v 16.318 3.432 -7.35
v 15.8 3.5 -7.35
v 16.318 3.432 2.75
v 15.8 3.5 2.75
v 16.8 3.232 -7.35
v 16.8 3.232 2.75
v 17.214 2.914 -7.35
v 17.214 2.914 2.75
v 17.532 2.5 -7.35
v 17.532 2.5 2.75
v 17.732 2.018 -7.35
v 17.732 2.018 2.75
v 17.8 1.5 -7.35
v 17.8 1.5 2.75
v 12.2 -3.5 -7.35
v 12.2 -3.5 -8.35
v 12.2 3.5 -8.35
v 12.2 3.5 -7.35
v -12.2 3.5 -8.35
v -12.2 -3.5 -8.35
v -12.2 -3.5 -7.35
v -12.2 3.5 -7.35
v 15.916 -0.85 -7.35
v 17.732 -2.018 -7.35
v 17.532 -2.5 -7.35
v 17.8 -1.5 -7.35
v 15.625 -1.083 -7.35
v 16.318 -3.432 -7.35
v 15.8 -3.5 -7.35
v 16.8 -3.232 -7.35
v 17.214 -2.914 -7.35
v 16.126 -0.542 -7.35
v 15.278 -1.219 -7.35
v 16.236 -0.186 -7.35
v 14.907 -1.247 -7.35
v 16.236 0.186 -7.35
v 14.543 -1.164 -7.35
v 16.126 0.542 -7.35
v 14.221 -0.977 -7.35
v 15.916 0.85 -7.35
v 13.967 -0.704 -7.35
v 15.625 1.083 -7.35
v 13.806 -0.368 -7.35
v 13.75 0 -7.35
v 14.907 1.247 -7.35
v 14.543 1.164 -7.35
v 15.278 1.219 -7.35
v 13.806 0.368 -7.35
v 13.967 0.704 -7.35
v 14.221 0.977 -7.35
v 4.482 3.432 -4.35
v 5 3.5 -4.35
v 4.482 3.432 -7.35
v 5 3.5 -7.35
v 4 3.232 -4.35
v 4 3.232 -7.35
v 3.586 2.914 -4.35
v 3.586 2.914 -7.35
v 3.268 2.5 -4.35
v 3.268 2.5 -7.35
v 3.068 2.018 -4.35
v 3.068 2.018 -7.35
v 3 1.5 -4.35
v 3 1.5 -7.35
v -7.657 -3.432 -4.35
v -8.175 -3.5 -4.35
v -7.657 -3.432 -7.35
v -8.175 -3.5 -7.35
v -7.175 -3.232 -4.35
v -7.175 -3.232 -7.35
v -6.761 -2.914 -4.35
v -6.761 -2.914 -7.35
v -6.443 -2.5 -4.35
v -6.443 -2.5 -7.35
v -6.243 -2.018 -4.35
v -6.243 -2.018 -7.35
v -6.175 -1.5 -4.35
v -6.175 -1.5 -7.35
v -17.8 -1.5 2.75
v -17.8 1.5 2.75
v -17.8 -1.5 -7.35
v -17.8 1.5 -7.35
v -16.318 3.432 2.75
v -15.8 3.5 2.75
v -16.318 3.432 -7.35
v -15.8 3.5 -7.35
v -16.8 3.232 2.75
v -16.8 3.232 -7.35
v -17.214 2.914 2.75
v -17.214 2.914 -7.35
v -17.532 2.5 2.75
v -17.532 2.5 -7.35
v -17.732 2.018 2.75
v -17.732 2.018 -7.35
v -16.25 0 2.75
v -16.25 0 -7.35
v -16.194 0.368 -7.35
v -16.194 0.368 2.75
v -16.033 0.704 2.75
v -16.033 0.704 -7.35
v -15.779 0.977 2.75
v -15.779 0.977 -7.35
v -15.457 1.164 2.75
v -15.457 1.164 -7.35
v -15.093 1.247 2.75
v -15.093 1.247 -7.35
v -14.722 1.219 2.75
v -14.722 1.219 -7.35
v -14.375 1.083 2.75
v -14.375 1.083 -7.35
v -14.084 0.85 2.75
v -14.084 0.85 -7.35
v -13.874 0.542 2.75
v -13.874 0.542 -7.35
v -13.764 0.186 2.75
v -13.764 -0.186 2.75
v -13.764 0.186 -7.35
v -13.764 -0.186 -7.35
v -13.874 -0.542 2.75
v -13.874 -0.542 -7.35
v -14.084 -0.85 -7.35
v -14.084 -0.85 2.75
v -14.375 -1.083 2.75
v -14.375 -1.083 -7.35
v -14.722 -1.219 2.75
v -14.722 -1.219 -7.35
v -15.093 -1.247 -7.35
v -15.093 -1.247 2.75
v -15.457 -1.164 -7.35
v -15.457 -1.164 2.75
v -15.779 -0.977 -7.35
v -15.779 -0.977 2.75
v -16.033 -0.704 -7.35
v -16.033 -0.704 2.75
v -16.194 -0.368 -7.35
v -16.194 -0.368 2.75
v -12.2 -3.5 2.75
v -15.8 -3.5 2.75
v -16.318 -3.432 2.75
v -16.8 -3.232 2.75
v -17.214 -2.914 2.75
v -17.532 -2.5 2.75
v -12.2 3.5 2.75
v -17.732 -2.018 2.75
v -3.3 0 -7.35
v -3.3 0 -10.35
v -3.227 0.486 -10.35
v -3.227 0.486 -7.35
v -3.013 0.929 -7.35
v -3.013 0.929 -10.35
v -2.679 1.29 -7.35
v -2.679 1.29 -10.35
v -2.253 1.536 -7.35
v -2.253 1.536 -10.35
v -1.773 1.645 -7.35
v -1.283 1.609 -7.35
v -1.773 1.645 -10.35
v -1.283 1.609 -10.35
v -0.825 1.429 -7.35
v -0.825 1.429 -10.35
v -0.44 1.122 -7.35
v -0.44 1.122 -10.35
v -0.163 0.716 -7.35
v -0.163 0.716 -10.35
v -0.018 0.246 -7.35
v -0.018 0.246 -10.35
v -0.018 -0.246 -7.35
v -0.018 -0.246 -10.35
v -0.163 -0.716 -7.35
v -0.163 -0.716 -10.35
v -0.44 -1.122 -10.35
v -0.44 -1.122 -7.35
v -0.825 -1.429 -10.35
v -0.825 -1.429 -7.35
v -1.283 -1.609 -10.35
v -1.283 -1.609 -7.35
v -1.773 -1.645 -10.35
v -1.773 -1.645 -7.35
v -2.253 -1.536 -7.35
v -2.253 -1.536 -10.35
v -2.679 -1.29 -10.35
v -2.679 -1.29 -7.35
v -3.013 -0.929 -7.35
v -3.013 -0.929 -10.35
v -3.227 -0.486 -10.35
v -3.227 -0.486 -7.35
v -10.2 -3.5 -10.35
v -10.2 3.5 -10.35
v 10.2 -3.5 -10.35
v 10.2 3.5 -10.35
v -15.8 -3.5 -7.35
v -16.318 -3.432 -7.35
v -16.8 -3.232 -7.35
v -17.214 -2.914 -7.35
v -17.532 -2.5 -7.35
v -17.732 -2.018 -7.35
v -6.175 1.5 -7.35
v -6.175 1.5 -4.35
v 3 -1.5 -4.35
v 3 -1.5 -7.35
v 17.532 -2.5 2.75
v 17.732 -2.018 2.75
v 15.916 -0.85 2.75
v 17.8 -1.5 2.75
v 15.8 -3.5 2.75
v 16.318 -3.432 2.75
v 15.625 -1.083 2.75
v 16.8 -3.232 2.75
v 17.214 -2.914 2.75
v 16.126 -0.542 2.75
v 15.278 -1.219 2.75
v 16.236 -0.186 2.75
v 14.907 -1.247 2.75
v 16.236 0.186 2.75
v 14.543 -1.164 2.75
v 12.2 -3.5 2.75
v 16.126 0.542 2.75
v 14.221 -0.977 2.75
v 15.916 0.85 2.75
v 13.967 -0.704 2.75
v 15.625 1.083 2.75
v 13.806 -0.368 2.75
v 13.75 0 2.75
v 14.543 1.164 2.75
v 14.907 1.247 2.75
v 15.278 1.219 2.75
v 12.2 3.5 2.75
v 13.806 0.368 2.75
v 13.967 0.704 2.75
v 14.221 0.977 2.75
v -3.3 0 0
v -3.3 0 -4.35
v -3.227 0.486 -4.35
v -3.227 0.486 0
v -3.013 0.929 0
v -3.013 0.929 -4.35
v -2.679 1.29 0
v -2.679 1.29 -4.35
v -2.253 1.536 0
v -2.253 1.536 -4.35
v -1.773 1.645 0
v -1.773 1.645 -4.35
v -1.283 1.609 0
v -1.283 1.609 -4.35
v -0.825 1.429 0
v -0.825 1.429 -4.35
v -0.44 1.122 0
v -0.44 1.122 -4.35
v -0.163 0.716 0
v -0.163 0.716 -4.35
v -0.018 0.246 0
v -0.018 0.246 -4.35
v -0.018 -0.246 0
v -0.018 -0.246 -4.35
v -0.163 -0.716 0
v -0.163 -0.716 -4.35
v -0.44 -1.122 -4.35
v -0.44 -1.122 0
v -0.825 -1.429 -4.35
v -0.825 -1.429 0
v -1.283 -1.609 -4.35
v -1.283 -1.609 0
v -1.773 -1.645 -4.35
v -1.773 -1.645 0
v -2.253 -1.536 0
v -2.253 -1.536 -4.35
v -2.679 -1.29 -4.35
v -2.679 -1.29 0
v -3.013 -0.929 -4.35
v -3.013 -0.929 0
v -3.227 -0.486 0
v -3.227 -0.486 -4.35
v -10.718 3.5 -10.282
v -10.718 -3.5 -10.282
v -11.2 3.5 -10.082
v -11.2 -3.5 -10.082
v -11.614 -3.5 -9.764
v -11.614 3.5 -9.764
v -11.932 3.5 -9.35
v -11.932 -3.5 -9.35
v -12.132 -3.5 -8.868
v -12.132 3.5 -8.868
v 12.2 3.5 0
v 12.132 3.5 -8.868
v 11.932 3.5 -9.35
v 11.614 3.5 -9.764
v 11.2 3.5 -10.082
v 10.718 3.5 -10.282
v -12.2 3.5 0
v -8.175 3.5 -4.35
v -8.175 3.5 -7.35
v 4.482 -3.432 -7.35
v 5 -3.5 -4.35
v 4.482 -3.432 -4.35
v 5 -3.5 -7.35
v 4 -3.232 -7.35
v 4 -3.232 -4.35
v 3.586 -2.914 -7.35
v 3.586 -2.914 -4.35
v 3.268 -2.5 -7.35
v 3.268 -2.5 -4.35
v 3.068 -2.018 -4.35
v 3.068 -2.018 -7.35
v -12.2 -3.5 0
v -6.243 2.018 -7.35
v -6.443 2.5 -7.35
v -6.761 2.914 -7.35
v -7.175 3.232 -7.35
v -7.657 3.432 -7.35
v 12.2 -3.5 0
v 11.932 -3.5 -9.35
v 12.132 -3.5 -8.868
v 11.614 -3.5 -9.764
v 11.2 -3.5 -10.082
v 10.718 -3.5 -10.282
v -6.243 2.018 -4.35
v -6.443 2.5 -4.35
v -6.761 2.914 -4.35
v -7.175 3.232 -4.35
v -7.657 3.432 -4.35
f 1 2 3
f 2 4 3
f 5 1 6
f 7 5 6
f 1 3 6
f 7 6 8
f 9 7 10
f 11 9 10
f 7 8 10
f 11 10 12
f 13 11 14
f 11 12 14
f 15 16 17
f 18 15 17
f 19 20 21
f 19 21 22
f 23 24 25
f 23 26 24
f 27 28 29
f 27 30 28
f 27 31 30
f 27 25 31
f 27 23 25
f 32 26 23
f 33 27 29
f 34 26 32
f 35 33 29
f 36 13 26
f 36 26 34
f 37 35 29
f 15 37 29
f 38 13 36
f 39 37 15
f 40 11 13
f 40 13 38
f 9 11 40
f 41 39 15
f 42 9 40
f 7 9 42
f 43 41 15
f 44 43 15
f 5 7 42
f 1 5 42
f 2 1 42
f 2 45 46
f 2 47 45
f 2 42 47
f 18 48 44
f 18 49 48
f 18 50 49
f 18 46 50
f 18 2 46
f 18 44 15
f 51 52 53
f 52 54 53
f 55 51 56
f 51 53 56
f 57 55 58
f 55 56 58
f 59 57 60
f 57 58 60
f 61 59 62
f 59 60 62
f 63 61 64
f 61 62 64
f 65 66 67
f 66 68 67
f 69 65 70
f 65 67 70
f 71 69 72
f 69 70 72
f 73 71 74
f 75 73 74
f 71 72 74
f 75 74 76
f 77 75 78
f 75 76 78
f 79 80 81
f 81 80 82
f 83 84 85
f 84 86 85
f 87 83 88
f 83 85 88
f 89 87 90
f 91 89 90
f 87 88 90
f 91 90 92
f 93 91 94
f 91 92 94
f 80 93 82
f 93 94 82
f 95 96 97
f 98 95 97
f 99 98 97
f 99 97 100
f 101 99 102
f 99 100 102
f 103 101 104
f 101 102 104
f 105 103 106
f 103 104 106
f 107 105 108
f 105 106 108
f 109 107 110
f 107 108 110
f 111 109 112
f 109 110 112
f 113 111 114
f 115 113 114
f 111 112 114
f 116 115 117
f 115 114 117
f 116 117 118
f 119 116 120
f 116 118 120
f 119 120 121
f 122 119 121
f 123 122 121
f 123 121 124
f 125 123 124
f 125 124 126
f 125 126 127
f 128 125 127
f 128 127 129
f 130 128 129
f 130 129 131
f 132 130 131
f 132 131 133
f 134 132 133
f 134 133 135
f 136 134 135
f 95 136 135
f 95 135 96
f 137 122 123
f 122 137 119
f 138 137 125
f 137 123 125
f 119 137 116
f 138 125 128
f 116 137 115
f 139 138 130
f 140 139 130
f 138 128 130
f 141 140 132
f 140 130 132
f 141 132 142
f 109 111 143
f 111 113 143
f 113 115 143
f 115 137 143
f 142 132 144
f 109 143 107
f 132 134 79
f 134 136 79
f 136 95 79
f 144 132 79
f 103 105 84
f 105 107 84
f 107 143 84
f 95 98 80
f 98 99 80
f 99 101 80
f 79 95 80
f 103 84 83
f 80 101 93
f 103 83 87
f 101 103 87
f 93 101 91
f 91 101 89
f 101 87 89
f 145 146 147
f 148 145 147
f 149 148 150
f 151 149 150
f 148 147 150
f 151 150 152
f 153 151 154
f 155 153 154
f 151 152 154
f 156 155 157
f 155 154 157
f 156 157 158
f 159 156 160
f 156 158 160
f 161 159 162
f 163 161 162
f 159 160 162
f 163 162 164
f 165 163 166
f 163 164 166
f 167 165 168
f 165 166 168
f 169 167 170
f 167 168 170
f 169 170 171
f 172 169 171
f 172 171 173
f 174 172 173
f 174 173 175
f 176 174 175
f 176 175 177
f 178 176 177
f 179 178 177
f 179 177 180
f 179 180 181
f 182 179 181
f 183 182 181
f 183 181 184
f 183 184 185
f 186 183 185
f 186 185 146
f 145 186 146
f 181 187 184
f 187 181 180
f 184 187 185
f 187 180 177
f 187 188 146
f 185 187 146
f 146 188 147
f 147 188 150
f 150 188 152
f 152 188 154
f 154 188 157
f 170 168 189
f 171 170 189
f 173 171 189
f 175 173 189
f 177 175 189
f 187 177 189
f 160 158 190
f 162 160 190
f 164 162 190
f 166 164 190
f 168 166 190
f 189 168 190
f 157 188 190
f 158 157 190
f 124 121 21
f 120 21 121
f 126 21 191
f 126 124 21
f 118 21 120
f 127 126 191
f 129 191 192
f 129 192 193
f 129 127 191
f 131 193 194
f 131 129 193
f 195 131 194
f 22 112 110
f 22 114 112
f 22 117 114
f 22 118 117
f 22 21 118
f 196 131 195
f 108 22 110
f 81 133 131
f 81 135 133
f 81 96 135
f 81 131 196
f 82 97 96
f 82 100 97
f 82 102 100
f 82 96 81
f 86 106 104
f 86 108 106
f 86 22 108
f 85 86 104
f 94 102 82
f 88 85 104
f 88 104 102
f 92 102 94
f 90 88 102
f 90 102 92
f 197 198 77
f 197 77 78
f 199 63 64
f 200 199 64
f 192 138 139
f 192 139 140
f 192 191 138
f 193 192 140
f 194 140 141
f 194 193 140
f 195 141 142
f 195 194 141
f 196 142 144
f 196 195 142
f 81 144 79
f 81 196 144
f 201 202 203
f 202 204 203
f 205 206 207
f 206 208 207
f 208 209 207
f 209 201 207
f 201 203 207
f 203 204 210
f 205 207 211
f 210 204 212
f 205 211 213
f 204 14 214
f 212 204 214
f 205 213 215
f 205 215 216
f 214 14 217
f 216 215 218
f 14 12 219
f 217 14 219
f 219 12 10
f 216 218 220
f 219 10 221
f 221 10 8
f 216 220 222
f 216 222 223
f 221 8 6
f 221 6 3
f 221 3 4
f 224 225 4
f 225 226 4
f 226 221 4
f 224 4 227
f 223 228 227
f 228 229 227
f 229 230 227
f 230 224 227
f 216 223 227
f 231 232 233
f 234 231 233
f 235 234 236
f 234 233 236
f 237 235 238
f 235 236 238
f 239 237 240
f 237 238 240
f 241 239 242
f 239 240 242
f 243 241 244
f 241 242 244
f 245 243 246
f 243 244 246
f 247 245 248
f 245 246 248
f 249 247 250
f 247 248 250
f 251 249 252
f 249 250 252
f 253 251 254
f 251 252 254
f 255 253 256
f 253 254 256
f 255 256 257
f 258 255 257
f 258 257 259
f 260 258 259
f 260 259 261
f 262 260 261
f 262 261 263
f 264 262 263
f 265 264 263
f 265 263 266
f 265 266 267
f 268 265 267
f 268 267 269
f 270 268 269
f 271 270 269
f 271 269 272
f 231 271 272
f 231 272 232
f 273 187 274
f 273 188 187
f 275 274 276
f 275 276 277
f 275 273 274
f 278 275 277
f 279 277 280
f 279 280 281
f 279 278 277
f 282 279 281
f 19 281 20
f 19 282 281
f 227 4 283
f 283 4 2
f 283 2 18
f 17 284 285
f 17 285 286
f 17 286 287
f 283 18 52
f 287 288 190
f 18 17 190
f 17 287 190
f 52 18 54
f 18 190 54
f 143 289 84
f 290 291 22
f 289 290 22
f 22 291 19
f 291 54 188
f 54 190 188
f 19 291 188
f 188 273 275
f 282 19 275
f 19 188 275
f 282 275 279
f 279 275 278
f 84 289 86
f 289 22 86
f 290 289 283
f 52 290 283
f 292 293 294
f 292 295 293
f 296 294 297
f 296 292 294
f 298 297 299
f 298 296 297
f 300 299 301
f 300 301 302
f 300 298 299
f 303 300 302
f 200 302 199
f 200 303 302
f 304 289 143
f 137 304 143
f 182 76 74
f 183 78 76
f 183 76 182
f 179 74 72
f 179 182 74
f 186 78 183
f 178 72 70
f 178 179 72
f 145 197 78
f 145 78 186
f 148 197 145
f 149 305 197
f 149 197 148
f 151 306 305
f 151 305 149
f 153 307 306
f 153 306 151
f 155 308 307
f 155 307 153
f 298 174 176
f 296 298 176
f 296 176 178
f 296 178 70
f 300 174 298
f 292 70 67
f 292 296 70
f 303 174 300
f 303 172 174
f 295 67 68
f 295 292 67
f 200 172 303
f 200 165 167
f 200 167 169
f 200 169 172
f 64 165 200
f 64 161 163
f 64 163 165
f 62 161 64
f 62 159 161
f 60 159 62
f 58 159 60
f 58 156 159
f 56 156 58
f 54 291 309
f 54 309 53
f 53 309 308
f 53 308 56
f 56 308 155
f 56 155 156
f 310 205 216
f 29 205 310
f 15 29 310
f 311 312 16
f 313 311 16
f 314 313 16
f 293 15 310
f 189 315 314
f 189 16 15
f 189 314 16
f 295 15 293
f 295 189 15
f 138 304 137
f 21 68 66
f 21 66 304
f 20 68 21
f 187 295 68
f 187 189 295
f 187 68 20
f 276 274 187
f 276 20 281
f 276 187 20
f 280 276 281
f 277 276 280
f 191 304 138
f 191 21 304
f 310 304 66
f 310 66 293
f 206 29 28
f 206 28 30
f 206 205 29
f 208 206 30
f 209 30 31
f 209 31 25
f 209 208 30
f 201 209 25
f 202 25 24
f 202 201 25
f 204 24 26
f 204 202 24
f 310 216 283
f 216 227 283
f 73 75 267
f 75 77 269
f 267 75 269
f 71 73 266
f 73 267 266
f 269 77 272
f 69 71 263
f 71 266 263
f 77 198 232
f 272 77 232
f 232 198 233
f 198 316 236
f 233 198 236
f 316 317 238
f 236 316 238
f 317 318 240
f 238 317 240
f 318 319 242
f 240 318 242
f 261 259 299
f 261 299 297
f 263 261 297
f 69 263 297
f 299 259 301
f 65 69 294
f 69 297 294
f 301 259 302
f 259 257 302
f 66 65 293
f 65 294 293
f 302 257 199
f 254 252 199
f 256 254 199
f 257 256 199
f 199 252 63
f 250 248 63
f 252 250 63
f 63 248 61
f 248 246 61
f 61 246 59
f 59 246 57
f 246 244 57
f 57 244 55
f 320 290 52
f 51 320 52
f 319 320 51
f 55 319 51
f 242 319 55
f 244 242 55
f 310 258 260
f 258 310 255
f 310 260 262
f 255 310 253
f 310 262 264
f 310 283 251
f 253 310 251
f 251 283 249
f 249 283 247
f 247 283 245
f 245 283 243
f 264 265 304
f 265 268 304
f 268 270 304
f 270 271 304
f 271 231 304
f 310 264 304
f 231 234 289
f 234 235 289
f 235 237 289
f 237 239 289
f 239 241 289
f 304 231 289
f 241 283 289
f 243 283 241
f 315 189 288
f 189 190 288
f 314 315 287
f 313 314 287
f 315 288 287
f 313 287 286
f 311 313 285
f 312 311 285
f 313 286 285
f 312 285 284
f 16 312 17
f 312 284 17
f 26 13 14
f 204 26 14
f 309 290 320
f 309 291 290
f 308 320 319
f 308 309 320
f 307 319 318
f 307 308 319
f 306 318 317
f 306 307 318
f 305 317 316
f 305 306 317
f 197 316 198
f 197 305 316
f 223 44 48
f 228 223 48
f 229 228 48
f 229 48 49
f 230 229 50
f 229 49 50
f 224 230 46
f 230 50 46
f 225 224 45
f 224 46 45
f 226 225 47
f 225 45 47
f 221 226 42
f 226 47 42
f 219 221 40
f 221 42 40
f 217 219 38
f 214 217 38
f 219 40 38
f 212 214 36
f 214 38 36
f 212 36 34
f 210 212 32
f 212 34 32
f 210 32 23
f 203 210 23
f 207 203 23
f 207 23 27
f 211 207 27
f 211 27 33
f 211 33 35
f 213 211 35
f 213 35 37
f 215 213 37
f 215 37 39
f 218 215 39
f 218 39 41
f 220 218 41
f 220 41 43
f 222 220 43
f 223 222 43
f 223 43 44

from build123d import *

# Parameters (mm, degrees)
SKETCH1_W           = 9.175
SKETCH1_H           = 3
BOSS_EXTRUDE1_DEPTH = 3.5
SKETCH2_R           = 1.25
SKETCH2_R_2         = 1.65
CUT_EXTRUDE1_DEPTH  = 14.1
SKETCH3_W           = 5.6
SKETCH3_H           = 7
CUT_EXTRUDE2_DEPTH  = 3
FILLET1_R           = 2


with BuildPart() as part:
    # Sketch1 → Boss-Extrude1 (new body, symmetric)
    with BuildSketch(Plane(origin=(0, 0, 0), x_dir=(1, 0, 0), z_dir=(0, 1, 0))):
        Polygon((-17.8, 10.35), (17.8, 10.35), (17.8, -2.75), (12.2, -2.75), (12.2, 0), (-12.2, 0), (-12.2, -2.75), (-17.8, -2.75), align=None)
        with Locations((-1.5875, 5.85)):
            Rectangle(SKETCH1_W, SKETCH1_H, mode=Mode.SUBTRACT)
    extrude(amount=BOSS_EXTRUDE1_DEPTH, both=True)

    # Sketch2 → Cut-Extrude1 (cut, through all)
    with BuildSketch(Plane(origin=(0, 0, -10.35), x_dir=(-1, 0, 0), z_dir=(0, 0, -1))):
        with Locations((15, 0)):
            Circle(SKETCH2_R)
        with Locations((1.65, 0)):
            Circle(SKETCH2_R_2)
        with Locations((-15, 0)):
            Circle(SKETCH2_R)
    extrude(amount=-CUT_EXTRUDE1_DEPTH, mode=Mode.SUBTRACT)

    # Sketch3 → Cut-Extrude2 (cut)
    with BuildSketch(Plane(origin=(0, 0, -10.35), x_dir=(-1, 0, 0), z_dir=(0, 0, -1))):
        with Locations((15, 0)):
            Rectangle(SKETCH3_W, SKETCH3_H)
        with Locations((-15, 0)):
            Rectangle(SKETCH3_W, SKETCH3_H)
    extrude(amount=-CUT_EXTRUDE2_DEPTH, mode=Mode.SUBTRACT)

    # Fillet1
    fillet1_edges = [part.edges().sort_by_distance(p)[0] for p in [
        (17.8, -3.5, -2.3),
        (-6.175, -3.5, -5.85),
        (3, -3.5, -5.85),
        (-6.175, 3.5, -5.85),
        (3, 3.5, -5.85),
        (-17.8, -3.5, -2.3),
        (-17.8, 3.5, -2.3),
        (-12.2, 0, -10.35),
        (17.8, 3.5, -2.3),
        (12.2, 0, -10.35),
    ]]
    fillet(fillet1_edges, radius=FILLET1_R)


solid = part.part
